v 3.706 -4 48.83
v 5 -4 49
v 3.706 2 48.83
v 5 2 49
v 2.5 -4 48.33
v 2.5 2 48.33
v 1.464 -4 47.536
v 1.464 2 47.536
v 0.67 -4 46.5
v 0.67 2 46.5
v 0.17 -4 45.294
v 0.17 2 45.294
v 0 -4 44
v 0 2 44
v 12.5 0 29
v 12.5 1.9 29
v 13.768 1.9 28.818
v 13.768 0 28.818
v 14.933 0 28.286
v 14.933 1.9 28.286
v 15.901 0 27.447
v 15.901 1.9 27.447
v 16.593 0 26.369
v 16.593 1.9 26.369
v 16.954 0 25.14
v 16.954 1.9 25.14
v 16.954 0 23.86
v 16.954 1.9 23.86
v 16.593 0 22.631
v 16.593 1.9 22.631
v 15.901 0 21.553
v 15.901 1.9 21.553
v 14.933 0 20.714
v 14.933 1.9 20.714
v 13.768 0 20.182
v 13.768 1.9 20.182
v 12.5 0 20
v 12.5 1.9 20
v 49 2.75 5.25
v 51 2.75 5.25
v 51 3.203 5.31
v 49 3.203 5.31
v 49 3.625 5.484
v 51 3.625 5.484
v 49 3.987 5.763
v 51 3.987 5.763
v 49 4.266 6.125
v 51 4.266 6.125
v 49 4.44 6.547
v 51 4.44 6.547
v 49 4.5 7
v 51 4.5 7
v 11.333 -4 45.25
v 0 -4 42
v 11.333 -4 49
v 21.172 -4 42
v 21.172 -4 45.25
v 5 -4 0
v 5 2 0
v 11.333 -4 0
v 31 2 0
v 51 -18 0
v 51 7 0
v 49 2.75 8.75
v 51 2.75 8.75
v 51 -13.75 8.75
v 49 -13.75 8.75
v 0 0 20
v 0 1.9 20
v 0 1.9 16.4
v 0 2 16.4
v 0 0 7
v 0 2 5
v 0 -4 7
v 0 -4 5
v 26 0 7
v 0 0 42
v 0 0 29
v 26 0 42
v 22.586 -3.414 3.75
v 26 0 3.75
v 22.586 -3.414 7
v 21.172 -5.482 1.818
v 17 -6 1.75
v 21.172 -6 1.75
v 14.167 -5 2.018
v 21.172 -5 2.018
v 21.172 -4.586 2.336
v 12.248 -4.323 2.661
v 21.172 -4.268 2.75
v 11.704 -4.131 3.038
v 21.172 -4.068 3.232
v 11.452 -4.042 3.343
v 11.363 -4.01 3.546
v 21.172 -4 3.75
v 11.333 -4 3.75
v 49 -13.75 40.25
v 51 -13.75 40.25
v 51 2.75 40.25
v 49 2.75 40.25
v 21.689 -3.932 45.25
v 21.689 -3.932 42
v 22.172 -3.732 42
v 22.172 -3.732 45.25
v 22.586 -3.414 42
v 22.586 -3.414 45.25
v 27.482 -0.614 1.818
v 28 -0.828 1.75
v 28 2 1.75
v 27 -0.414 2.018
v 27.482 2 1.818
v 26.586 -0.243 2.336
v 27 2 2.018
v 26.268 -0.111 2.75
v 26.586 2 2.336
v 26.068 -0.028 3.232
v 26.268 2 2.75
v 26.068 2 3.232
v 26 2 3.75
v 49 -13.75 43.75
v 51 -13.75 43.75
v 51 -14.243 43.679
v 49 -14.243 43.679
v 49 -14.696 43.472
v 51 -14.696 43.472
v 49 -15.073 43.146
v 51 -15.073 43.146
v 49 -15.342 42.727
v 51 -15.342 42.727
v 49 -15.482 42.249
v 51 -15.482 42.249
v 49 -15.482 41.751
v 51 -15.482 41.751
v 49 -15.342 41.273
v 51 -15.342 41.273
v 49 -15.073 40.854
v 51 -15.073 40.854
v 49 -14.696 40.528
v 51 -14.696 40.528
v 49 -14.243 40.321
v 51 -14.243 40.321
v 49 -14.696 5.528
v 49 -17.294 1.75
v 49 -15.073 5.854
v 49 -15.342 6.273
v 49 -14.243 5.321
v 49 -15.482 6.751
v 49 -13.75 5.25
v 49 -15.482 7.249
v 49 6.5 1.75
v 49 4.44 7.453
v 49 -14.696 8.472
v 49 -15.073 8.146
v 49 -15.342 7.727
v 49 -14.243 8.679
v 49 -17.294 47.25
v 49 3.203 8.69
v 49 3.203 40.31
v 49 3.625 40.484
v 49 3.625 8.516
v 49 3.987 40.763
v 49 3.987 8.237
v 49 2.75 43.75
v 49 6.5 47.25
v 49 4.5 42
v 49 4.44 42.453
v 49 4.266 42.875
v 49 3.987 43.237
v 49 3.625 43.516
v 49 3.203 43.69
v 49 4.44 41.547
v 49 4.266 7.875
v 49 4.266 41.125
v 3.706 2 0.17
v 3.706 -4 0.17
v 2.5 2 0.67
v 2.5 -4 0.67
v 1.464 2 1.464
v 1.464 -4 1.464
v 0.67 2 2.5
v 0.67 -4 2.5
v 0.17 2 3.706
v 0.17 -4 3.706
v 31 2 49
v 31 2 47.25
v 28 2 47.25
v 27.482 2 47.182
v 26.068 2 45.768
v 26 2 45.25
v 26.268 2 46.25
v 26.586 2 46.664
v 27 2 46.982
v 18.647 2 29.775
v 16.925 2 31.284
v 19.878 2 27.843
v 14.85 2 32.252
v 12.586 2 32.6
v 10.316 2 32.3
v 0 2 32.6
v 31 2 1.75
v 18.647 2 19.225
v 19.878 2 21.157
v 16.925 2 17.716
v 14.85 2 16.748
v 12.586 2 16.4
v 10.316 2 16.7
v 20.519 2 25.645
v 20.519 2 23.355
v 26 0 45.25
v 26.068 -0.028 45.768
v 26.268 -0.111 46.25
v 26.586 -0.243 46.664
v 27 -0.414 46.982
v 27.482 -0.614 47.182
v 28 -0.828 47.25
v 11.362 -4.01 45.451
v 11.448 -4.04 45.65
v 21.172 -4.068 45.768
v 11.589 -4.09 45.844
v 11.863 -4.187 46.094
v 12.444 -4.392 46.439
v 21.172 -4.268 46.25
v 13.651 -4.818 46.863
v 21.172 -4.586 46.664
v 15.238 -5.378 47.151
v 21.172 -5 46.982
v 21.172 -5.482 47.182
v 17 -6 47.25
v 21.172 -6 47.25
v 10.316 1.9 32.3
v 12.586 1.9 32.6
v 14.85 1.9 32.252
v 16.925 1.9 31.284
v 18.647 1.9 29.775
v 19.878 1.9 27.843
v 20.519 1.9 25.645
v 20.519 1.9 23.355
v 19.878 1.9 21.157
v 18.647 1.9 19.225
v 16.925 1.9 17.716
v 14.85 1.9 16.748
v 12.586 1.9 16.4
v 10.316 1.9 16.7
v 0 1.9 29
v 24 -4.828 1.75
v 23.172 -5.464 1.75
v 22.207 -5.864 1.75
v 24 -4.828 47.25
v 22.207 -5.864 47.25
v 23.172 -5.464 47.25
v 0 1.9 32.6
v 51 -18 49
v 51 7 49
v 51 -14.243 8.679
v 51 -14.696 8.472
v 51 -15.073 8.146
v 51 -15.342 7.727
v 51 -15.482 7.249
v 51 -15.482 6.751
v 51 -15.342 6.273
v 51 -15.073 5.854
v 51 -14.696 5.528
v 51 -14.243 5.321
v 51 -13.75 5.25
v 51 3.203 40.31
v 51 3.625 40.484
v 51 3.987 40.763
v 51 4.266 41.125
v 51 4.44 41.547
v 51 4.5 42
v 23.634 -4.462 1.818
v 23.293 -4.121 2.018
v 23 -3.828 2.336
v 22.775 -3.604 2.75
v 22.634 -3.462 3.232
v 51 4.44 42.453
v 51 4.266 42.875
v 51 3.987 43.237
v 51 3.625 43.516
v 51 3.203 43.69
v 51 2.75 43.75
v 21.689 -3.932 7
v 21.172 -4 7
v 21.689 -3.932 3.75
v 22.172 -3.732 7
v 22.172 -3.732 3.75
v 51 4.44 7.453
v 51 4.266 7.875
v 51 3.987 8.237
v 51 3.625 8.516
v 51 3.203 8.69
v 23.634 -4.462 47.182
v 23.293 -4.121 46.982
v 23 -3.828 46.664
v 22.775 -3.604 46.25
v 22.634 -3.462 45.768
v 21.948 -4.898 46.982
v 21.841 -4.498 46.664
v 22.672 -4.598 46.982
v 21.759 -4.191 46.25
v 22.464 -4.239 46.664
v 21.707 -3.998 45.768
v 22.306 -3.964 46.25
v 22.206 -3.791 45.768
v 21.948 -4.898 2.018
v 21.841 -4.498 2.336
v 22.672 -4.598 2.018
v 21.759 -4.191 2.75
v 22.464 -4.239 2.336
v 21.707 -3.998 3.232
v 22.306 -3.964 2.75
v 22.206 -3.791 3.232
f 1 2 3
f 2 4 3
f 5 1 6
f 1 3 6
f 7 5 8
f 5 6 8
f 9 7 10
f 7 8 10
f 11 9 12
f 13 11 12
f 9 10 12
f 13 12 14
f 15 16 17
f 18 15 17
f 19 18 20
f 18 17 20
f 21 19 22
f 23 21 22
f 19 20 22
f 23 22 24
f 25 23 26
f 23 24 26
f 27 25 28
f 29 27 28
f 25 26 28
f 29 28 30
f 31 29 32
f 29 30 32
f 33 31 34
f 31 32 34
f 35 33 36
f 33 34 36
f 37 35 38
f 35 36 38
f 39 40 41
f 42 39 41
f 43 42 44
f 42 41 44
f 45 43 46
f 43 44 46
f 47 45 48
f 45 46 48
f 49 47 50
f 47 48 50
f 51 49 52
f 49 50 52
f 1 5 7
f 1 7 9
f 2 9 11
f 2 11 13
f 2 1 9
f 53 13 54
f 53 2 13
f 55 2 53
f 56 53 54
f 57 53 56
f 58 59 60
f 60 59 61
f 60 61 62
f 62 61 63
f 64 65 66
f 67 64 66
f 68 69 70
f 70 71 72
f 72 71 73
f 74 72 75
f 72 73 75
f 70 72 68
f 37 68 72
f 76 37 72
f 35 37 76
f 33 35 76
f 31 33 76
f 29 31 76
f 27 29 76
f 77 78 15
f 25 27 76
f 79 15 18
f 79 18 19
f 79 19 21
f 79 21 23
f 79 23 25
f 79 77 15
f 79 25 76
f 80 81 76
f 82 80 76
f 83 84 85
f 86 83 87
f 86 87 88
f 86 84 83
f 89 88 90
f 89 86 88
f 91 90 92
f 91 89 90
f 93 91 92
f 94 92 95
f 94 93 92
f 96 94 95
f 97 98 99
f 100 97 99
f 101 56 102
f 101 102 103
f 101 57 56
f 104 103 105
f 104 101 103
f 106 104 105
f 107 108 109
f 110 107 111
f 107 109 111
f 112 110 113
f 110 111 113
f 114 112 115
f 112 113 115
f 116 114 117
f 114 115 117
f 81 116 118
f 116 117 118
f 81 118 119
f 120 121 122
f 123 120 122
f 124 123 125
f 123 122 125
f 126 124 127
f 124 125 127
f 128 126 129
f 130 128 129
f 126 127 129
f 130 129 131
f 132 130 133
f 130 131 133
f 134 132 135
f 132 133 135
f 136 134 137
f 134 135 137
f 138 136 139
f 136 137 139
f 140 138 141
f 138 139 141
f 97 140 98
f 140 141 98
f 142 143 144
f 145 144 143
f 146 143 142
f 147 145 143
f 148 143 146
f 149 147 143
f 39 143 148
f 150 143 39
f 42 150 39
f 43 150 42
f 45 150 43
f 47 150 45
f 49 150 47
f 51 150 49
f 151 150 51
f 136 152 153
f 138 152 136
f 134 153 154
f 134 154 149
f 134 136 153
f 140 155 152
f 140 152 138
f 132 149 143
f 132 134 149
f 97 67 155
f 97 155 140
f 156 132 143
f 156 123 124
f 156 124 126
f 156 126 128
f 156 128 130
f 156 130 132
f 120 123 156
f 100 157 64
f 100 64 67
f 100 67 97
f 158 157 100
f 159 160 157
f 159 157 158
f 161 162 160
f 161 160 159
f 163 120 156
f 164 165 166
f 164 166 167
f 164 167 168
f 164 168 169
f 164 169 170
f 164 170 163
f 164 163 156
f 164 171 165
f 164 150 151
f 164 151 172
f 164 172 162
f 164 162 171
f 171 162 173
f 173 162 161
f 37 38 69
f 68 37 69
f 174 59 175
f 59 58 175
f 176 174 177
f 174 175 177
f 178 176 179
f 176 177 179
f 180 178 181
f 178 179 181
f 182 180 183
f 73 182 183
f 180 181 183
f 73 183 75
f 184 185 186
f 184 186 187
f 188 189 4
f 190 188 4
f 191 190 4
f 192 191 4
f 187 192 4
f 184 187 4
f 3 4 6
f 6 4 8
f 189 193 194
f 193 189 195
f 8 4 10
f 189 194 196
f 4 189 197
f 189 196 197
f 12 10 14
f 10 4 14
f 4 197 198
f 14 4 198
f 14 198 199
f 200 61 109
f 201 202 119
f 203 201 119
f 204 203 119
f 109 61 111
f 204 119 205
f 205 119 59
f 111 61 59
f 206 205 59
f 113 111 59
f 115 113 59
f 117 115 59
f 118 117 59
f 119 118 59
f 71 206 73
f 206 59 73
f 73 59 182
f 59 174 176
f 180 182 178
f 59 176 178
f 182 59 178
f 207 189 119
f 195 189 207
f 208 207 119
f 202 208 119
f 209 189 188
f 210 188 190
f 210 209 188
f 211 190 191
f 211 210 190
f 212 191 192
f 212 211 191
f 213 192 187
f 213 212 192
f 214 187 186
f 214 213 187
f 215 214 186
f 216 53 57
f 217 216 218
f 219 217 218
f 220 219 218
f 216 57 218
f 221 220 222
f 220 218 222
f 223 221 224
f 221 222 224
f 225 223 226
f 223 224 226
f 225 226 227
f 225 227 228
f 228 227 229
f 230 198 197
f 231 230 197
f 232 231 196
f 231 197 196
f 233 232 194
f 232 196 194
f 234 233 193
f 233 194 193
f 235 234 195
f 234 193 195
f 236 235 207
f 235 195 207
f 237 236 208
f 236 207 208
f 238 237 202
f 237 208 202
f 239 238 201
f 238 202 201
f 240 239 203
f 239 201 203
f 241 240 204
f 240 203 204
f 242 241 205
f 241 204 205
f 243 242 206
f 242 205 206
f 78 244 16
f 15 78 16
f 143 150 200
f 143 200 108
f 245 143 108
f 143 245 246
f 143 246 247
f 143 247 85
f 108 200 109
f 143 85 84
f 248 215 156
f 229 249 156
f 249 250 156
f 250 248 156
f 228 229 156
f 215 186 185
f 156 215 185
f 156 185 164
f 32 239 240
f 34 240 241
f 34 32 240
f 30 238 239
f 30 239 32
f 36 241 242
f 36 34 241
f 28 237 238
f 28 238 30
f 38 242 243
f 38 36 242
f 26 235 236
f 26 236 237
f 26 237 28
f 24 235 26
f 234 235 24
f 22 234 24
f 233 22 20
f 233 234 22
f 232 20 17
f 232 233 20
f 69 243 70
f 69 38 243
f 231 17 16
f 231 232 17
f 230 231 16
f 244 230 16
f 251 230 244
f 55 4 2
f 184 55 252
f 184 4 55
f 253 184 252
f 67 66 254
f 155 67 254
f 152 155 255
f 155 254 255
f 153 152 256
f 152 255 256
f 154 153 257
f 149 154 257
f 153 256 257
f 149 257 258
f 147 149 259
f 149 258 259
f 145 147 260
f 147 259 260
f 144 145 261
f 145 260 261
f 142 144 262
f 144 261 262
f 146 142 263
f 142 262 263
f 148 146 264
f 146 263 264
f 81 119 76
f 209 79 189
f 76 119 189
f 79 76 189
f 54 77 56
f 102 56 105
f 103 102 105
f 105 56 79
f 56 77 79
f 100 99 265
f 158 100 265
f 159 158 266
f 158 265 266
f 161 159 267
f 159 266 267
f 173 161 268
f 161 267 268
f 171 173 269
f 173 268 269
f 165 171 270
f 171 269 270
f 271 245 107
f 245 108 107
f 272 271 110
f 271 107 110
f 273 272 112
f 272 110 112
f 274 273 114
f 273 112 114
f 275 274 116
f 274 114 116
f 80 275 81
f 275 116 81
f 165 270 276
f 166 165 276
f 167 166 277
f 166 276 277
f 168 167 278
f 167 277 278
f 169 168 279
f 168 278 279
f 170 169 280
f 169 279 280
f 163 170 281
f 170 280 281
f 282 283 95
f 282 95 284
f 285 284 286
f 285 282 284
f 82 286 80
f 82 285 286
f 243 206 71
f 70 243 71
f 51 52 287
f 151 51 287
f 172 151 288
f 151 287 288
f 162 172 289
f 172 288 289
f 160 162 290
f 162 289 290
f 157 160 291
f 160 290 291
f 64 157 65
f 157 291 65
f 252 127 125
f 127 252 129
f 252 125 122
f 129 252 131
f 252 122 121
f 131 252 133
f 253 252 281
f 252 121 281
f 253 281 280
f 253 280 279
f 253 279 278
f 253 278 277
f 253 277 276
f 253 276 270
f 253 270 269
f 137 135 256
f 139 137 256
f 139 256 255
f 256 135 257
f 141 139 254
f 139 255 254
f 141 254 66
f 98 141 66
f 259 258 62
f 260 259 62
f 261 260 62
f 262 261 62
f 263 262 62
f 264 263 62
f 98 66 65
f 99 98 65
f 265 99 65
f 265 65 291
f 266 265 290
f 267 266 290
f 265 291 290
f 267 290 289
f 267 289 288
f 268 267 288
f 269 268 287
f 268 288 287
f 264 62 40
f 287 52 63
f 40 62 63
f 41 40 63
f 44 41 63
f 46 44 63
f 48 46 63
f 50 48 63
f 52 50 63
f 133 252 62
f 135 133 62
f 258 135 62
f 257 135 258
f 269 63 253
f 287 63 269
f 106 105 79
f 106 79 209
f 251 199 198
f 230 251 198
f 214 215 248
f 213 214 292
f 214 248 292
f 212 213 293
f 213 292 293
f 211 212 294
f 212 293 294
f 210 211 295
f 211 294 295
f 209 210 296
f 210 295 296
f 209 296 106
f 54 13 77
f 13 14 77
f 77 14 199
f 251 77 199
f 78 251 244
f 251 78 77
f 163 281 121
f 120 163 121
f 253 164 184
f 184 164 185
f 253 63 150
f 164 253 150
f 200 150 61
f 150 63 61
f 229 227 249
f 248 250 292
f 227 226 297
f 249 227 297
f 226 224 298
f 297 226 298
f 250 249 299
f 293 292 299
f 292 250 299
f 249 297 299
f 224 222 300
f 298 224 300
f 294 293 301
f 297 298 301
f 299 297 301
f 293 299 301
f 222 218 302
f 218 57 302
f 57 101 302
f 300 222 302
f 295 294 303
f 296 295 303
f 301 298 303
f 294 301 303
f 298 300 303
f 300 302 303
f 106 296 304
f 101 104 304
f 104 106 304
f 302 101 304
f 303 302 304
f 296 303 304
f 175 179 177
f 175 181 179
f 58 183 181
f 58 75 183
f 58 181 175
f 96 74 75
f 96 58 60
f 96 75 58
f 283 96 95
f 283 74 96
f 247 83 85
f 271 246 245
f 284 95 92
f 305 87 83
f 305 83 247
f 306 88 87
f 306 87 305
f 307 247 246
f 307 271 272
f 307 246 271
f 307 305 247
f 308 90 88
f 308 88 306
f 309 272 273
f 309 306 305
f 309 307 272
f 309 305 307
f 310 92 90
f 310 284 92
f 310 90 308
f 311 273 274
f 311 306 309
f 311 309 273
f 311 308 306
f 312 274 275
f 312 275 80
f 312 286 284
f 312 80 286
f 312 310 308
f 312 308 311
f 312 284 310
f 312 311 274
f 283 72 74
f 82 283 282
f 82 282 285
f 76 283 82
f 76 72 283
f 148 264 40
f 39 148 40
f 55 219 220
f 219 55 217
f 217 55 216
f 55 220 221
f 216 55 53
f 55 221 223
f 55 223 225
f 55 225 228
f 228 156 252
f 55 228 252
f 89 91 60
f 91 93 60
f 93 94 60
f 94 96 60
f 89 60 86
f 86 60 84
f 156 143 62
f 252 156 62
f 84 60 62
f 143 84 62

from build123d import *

# Parameters (mm, degrees)
F1_DEPTH  = 49
F3_DEPTH  = 8.001
F4_W      = 18
F4_H      = 45.5
F4_W_2    = 5
F5_DEPTH  = 25
F7_DEPTH  = 2
F8_W      = 33.7460841984
F8_H      = 45.5
F9_DEPTH  = 18.001
F11_DEPTH = 0.1
F12_W     = 26
F12_H     = 1.75
F12_H_2   = 5.25
F13_DEPTH = 4
F14_SIZE  = 4
F15_R     = 2
F16_R     = 5


# Not quite as in the source:
# - a feature names something its author has since deleted; it is built from what else it names


with BuildPart() as f1:
    # F0 (on Top) → F1 (new body)
    with BuildSketch(Plane.XY):
        Polygon((31, 2), (0, 2), (0, 0), (51, -18), (51, 2), align=None)
        Polygon((51, 7), (31, 2), (51, 2), align=None)
    extrude(amount=F1_DEPTH)

    # F2 (on face) → F3 (cut, through all)
    with BuildSketch(Plane(origin=(0, 2, 0), x_dir=(-1, 0, 0), z_dir=(0, 1, 0))):
        with BuildLine():
            Line((0, 29), (-12.5, 29))
            ThreePointArc((-12.5, 29), (-17, 24.5), (-12.5, 20))
            Line((-12.5, 20), (0, 20))
            Line((0, 20), (0, 29))
        make_face()
    extrude(amount=-F3_DEPTH, mode=Mode.SUBTRACT)

    # F4 (on face) → F5 (cut, symmetric)
    with BuildSketch(Plane(origin=(0, 2, 0), x_dir=(-1, 0, 0), z_dir=(0, 1, 0))):
        with Locations((-40, 24.5)):
            Rectangle(F4_W, F4_H)
        with Locations((-28.5, 24.5)):
            Rectangle(F4_W_2, F4_H)
    extrude(amount=F5_DEPTH, both=True, mode=Mode.SUBTRACT)

    # F6 (on face) → F7 (cut, through all)
    with BuildSketch(Plane.YZ.offset(51)):
        with BuildLine():
            ThreePointArc((2.75, 40.25), (1, 42), (2.75, 43.75))
            Line((2.75, 43.75), (-13.75, 43.75))
            ThreePointArc((-13.75, 43.75), (-12.5125631329, 43.2374368671), (-12, 42))
            ThreePointArc((-12, 42), (-12.5125631329, 40.7625631329), (-13.75, 40.25))
            Line((-13.75, 40.25), (2.75, 40.25))
        make_face()
        with BuildLine():
            ThreePointArc((-12, 42), (-12.5125631329, 43.2374368671), (-13.75, 43.75))
            ThreePointArc((-13.75, 43.75), (-15.5, 42), (-13.75, 40.25))
            ThreePointArc((-13.75, 40.25), (-12.5125631329, 40.7625631329), (-12, 42))
        make_face()
        with BuildLine():
            ThreePointArc((2.75, 40.25), (3.9874368671, 40.7625631329), (4.5, 42))
            ThreePointArc((4.5, 42), (3.9874368671, 43.2374368671), (2.75, 43.75))
            ThreePointArc((2.75, 43.75), (1, 42), (2.75, 40.25))
        make_face()
        with BuildLine():
            ThreePointArc((2.75, 5.25), (1, 7), (2.75, 8.75))
            Line((2.75, 8.75), (-13.75, 8.75))
            ThreePointArc((-13.75, 8.75), (-12.5125631329, 8.2374368671), (-12, 7))
            ThreePointArc((-12, 7), (-12.5125631329, 5.7625631329), (-13.75, 5.25))
            Line((-13.75, 5.25), (2.75, 5.25))
        make_face()
        with BuildLine():
            ThreePointArc((-12, 7), (-12.5125631329, 8.2374368671), (-13.75, 8.75))
            ThreePointArc((-13.75, 8.75), (-15.5, 7), (-13.75, 5.25))
            ThreePointArc((-13.75, 5.25), (-12.5125631329, 5.7625631329), (-12, 7))
        make_face()
        with BuildLine():
            ThreePointArc((4.5, 7), (3.9874368671, 8.2374368671), (2.75, 8.75))
            ThreePointArc((2.75, 8.75), (1, 7), (2.75, 5.25))
            ThreePointArc((2.75, 5.25), (3.9874368671, 5.7625631329), (4.5, 7))
        make_face()
    extrude(amount=-F7_DEPTH, mode=Mode.SUBTRACT)

    # F8 (on Front) → F9 (cut, through all)
    with BuildSketch(Plane.XZ):
        with Locations((14.1801619902, 24.5)):
            Rectangle(F8_W, F8_H)
    extrude(amount=F9_DEPTH, mode=Mode.SUBTRACT)

    # F10 (on face) → F11 (cut)
    with BuildSketch(Plane(origin=(0, 2, 0), x_dir=(-1, 0, 0), z_dir=(0, 1, 0))):
        with BuildLine():
            ThreePointArc((-10.3159670332, 16.7), (-6.0462930408, 19.6051387676), (-4.4, 24.5))
            ThreePointArc((-4.4, 24.5), (-6.0462930408, 29.3948612324), (-10.3159670332, 32.3))
            ThreePointArc((-10.3159670332, 32.3), (-20.6, 24.5), (-10.3159670332, 16.7))
        make_face()
        with BuildLine():
            ThreePointArc((-10.3159670332, 32.3), (-6.0462930408, 29.3948612324), (-4.4, 24.5))
            ThreePointArc((-4.4, 24.5), (-6.0462930408, 19.6051387676), (-10.3159670332, 16.7))
            Line((-10.3159670332, 16.7), (0, 16.4))
            Line((0, 16.4), (0, 32.6))
            Line((0, 32.6), (-10.3159670332, 32.3))
        make_face()
    extrude(amount=-F11_DEPTH, mode=Mode.SUBTRACT)

    # F12 (on face) → F13 (join)
    with BuildSketch(Plane.XZ):
        with Locations((13, 48.125)):
            Rectangle(F12_W, F12_H)
        with Locations((13, 0.875)):
            Rectangle(F12_W, F12_H)
        with Locations((13, 44.625)):
            Rectangle(F12_W, F12_H_2)
        with Locations((13, 4.375)):
            Rectangle(F12_W, F12_H_2)
    extrude(amount=F13_DEPTH)

    # F14
    f14_edges = [f1.edges().sort_by_distance(p)[0] for p in [
        (26, -4, 4.375),
        (26, -4, 44.625),
    ]]
    chamfer(f14_edges, length=F14_SIZE)

    # F15
    f15_edges = [f1.edges().sort_by_distance(p)[0] for p in [
        (16.666667, -4, 1.75),
        (16.666667, -4, 47.25),
        (24, -2, 47.25),
        (24, -2, 1.75),
        (22, -4, 4.375),
        (22, -4, 44.625),
        (26, 1, 1.75),
        (26, 1, 47.25),
    ]]
    fillet(f15_edges, radius=F15_R)

    # F16
    f16_edges = [f1.edges().sort_by_distance(p)[0] for p in [
        (0, -1, 49),
        (0, -1, 0),
    ]]
    fillet(f16_edges, radius=F16_R)


solid = f1.part
